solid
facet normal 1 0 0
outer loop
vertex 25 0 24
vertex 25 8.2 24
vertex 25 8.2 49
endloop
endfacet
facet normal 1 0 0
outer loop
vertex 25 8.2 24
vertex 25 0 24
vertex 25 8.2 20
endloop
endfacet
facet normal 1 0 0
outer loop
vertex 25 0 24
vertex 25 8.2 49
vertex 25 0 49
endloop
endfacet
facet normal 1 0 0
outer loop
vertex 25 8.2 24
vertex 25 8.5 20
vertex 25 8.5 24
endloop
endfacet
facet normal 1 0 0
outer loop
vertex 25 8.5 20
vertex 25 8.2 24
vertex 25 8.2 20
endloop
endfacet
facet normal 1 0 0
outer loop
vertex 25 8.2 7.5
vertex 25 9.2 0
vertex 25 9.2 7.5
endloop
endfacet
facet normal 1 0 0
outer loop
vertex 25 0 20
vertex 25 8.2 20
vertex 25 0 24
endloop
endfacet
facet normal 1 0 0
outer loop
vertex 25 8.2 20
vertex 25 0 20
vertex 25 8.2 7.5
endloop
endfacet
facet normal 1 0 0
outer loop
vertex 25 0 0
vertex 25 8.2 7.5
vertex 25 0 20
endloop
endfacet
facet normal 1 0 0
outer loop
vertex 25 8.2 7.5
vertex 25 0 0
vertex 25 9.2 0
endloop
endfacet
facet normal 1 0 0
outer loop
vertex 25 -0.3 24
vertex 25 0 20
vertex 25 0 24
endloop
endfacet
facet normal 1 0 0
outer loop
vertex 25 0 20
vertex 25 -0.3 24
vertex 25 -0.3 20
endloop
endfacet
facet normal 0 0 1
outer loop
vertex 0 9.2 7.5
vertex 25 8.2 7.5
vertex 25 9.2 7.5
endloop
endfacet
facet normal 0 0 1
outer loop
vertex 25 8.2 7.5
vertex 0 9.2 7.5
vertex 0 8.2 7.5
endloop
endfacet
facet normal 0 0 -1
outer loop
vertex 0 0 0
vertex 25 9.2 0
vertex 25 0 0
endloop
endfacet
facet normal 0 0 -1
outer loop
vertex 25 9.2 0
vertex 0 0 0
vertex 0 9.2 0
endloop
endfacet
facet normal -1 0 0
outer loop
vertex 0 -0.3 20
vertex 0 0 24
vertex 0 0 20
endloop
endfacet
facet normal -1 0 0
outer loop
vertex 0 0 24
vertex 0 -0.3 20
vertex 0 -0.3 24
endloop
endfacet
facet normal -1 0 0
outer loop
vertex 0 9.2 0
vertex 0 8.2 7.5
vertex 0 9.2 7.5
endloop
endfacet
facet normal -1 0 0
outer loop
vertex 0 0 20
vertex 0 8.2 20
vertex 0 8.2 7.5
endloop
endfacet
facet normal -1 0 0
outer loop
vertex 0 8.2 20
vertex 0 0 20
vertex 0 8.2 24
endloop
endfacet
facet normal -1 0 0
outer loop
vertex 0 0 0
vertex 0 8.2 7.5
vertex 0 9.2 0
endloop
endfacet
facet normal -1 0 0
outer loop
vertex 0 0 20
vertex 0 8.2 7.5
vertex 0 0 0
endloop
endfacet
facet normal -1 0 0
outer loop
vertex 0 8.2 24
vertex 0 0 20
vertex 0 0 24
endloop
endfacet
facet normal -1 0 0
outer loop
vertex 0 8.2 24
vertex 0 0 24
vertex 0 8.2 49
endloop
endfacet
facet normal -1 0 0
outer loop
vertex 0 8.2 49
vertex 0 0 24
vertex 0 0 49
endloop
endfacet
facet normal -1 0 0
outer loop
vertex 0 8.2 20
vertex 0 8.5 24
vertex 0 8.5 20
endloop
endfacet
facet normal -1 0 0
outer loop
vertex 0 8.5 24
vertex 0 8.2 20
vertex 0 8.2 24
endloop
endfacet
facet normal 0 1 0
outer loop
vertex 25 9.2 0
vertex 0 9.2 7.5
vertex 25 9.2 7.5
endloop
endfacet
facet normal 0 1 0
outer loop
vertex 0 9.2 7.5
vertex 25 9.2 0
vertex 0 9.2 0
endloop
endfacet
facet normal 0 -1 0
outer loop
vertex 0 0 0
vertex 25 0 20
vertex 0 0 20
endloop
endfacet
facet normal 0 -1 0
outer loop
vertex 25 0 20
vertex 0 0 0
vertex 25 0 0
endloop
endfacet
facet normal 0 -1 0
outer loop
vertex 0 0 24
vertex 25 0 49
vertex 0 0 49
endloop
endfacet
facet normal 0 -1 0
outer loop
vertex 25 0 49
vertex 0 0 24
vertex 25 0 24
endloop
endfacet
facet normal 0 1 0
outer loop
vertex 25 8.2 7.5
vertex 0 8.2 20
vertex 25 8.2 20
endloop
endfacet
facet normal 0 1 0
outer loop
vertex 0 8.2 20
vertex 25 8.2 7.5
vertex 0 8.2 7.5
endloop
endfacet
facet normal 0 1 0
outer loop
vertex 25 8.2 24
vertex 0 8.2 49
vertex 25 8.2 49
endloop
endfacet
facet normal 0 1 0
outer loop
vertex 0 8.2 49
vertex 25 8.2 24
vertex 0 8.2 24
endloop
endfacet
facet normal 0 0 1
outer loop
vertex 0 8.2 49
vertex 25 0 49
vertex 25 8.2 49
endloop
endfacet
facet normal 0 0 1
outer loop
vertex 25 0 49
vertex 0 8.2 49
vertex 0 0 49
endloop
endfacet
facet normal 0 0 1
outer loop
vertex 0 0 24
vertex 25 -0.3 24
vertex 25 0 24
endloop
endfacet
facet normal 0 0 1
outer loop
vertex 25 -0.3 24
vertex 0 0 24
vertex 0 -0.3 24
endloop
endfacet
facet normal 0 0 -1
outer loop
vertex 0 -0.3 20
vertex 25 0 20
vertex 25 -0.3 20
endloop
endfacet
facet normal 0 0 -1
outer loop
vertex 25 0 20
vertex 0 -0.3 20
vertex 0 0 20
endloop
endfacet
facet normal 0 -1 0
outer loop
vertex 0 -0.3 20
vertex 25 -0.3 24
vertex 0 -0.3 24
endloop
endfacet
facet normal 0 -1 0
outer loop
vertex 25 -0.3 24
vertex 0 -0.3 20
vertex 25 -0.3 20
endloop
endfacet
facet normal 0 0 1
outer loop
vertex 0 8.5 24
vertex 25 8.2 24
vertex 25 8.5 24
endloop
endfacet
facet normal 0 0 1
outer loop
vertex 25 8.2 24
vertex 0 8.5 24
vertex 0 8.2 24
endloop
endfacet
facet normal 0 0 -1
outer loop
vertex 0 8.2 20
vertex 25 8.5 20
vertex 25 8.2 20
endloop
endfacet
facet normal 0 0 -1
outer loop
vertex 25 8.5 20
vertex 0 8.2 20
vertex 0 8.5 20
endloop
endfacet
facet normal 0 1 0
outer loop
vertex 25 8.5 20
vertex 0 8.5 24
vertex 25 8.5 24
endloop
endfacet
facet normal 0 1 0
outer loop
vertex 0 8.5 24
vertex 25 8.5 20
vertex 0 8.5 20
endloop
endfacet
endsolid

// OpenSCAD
module wood_wall_back(x) {
  cube([25*x,9.2,7.5]);
  translate([0,0,7.5]) cube([25*x,8.2,3.7]);
  translate([0,0,11.2]) cube([25*x,8.2,37.8]);
  difference() {
    union() {
      for (i = [0:x-1]) {
        translate([25*i,0,11.2]) rotate([90,0,0]) scale([2/100, 37.8/1024, 1 / 256]) surface(file = str("wood/strip_0", i*2, ".dat"), convexity = 5);
        translate([25*i+23,0,11.2]) rotate([90,0,0]) scale([2/100, 37.8/1024, 1 / 256]) surface(file = str("wood/strip_0", i*2+1, ".dat"), convexity = 5);
      }
    }
    translate([25*(x-1)-1,-1.5,20]) cube([27,2,4]);
  }
  translate([0,-.3,20]) cube([25*x,.3,4]);
  for (i = [0:x-1]) {
    translate([25*i,-.3,24]) rotate([90,90,0]) scale([4/100, 25/1024, 1 / 256]) surface(file = str("wood/strip_0", 7+i, ".dat"), convexity = 5);
  }

  difference() {
    union() {
      for (i = [0:x-1]) {
        translate([25*i+2,8.2,7.4]) rotate([90,0,180]) scale([2/100, 41.6/1024, 1 / 256]) surface(file = str("wood/strip_1", i*2, ".dat"), convexity = 5);
        translate([25*i+25,8.2,7.4]) rotate([90,0,180]) scale([2/100, 41.6/1024, 1 / 256]) surface(file = str("wood/strip_1", i*2+1, ".dat"), convexity = 5);
      }
    }
    translate([-1,7.7,20]) cube([25*x+2,2,4]);
  }
  translate([0,8.2,20]) cube([25*x,.3,4]);
  for (i = [0:x-1]) {
  translate([25*i+25,8.5,24]) rotate([90,90,180]) scale([4/100, 25/1024, 1 / 256]) surface(file = str("wood/strip_1", 7+i, ".dat"), convexity = 5);
  }
}

wood_wall_back(1);
